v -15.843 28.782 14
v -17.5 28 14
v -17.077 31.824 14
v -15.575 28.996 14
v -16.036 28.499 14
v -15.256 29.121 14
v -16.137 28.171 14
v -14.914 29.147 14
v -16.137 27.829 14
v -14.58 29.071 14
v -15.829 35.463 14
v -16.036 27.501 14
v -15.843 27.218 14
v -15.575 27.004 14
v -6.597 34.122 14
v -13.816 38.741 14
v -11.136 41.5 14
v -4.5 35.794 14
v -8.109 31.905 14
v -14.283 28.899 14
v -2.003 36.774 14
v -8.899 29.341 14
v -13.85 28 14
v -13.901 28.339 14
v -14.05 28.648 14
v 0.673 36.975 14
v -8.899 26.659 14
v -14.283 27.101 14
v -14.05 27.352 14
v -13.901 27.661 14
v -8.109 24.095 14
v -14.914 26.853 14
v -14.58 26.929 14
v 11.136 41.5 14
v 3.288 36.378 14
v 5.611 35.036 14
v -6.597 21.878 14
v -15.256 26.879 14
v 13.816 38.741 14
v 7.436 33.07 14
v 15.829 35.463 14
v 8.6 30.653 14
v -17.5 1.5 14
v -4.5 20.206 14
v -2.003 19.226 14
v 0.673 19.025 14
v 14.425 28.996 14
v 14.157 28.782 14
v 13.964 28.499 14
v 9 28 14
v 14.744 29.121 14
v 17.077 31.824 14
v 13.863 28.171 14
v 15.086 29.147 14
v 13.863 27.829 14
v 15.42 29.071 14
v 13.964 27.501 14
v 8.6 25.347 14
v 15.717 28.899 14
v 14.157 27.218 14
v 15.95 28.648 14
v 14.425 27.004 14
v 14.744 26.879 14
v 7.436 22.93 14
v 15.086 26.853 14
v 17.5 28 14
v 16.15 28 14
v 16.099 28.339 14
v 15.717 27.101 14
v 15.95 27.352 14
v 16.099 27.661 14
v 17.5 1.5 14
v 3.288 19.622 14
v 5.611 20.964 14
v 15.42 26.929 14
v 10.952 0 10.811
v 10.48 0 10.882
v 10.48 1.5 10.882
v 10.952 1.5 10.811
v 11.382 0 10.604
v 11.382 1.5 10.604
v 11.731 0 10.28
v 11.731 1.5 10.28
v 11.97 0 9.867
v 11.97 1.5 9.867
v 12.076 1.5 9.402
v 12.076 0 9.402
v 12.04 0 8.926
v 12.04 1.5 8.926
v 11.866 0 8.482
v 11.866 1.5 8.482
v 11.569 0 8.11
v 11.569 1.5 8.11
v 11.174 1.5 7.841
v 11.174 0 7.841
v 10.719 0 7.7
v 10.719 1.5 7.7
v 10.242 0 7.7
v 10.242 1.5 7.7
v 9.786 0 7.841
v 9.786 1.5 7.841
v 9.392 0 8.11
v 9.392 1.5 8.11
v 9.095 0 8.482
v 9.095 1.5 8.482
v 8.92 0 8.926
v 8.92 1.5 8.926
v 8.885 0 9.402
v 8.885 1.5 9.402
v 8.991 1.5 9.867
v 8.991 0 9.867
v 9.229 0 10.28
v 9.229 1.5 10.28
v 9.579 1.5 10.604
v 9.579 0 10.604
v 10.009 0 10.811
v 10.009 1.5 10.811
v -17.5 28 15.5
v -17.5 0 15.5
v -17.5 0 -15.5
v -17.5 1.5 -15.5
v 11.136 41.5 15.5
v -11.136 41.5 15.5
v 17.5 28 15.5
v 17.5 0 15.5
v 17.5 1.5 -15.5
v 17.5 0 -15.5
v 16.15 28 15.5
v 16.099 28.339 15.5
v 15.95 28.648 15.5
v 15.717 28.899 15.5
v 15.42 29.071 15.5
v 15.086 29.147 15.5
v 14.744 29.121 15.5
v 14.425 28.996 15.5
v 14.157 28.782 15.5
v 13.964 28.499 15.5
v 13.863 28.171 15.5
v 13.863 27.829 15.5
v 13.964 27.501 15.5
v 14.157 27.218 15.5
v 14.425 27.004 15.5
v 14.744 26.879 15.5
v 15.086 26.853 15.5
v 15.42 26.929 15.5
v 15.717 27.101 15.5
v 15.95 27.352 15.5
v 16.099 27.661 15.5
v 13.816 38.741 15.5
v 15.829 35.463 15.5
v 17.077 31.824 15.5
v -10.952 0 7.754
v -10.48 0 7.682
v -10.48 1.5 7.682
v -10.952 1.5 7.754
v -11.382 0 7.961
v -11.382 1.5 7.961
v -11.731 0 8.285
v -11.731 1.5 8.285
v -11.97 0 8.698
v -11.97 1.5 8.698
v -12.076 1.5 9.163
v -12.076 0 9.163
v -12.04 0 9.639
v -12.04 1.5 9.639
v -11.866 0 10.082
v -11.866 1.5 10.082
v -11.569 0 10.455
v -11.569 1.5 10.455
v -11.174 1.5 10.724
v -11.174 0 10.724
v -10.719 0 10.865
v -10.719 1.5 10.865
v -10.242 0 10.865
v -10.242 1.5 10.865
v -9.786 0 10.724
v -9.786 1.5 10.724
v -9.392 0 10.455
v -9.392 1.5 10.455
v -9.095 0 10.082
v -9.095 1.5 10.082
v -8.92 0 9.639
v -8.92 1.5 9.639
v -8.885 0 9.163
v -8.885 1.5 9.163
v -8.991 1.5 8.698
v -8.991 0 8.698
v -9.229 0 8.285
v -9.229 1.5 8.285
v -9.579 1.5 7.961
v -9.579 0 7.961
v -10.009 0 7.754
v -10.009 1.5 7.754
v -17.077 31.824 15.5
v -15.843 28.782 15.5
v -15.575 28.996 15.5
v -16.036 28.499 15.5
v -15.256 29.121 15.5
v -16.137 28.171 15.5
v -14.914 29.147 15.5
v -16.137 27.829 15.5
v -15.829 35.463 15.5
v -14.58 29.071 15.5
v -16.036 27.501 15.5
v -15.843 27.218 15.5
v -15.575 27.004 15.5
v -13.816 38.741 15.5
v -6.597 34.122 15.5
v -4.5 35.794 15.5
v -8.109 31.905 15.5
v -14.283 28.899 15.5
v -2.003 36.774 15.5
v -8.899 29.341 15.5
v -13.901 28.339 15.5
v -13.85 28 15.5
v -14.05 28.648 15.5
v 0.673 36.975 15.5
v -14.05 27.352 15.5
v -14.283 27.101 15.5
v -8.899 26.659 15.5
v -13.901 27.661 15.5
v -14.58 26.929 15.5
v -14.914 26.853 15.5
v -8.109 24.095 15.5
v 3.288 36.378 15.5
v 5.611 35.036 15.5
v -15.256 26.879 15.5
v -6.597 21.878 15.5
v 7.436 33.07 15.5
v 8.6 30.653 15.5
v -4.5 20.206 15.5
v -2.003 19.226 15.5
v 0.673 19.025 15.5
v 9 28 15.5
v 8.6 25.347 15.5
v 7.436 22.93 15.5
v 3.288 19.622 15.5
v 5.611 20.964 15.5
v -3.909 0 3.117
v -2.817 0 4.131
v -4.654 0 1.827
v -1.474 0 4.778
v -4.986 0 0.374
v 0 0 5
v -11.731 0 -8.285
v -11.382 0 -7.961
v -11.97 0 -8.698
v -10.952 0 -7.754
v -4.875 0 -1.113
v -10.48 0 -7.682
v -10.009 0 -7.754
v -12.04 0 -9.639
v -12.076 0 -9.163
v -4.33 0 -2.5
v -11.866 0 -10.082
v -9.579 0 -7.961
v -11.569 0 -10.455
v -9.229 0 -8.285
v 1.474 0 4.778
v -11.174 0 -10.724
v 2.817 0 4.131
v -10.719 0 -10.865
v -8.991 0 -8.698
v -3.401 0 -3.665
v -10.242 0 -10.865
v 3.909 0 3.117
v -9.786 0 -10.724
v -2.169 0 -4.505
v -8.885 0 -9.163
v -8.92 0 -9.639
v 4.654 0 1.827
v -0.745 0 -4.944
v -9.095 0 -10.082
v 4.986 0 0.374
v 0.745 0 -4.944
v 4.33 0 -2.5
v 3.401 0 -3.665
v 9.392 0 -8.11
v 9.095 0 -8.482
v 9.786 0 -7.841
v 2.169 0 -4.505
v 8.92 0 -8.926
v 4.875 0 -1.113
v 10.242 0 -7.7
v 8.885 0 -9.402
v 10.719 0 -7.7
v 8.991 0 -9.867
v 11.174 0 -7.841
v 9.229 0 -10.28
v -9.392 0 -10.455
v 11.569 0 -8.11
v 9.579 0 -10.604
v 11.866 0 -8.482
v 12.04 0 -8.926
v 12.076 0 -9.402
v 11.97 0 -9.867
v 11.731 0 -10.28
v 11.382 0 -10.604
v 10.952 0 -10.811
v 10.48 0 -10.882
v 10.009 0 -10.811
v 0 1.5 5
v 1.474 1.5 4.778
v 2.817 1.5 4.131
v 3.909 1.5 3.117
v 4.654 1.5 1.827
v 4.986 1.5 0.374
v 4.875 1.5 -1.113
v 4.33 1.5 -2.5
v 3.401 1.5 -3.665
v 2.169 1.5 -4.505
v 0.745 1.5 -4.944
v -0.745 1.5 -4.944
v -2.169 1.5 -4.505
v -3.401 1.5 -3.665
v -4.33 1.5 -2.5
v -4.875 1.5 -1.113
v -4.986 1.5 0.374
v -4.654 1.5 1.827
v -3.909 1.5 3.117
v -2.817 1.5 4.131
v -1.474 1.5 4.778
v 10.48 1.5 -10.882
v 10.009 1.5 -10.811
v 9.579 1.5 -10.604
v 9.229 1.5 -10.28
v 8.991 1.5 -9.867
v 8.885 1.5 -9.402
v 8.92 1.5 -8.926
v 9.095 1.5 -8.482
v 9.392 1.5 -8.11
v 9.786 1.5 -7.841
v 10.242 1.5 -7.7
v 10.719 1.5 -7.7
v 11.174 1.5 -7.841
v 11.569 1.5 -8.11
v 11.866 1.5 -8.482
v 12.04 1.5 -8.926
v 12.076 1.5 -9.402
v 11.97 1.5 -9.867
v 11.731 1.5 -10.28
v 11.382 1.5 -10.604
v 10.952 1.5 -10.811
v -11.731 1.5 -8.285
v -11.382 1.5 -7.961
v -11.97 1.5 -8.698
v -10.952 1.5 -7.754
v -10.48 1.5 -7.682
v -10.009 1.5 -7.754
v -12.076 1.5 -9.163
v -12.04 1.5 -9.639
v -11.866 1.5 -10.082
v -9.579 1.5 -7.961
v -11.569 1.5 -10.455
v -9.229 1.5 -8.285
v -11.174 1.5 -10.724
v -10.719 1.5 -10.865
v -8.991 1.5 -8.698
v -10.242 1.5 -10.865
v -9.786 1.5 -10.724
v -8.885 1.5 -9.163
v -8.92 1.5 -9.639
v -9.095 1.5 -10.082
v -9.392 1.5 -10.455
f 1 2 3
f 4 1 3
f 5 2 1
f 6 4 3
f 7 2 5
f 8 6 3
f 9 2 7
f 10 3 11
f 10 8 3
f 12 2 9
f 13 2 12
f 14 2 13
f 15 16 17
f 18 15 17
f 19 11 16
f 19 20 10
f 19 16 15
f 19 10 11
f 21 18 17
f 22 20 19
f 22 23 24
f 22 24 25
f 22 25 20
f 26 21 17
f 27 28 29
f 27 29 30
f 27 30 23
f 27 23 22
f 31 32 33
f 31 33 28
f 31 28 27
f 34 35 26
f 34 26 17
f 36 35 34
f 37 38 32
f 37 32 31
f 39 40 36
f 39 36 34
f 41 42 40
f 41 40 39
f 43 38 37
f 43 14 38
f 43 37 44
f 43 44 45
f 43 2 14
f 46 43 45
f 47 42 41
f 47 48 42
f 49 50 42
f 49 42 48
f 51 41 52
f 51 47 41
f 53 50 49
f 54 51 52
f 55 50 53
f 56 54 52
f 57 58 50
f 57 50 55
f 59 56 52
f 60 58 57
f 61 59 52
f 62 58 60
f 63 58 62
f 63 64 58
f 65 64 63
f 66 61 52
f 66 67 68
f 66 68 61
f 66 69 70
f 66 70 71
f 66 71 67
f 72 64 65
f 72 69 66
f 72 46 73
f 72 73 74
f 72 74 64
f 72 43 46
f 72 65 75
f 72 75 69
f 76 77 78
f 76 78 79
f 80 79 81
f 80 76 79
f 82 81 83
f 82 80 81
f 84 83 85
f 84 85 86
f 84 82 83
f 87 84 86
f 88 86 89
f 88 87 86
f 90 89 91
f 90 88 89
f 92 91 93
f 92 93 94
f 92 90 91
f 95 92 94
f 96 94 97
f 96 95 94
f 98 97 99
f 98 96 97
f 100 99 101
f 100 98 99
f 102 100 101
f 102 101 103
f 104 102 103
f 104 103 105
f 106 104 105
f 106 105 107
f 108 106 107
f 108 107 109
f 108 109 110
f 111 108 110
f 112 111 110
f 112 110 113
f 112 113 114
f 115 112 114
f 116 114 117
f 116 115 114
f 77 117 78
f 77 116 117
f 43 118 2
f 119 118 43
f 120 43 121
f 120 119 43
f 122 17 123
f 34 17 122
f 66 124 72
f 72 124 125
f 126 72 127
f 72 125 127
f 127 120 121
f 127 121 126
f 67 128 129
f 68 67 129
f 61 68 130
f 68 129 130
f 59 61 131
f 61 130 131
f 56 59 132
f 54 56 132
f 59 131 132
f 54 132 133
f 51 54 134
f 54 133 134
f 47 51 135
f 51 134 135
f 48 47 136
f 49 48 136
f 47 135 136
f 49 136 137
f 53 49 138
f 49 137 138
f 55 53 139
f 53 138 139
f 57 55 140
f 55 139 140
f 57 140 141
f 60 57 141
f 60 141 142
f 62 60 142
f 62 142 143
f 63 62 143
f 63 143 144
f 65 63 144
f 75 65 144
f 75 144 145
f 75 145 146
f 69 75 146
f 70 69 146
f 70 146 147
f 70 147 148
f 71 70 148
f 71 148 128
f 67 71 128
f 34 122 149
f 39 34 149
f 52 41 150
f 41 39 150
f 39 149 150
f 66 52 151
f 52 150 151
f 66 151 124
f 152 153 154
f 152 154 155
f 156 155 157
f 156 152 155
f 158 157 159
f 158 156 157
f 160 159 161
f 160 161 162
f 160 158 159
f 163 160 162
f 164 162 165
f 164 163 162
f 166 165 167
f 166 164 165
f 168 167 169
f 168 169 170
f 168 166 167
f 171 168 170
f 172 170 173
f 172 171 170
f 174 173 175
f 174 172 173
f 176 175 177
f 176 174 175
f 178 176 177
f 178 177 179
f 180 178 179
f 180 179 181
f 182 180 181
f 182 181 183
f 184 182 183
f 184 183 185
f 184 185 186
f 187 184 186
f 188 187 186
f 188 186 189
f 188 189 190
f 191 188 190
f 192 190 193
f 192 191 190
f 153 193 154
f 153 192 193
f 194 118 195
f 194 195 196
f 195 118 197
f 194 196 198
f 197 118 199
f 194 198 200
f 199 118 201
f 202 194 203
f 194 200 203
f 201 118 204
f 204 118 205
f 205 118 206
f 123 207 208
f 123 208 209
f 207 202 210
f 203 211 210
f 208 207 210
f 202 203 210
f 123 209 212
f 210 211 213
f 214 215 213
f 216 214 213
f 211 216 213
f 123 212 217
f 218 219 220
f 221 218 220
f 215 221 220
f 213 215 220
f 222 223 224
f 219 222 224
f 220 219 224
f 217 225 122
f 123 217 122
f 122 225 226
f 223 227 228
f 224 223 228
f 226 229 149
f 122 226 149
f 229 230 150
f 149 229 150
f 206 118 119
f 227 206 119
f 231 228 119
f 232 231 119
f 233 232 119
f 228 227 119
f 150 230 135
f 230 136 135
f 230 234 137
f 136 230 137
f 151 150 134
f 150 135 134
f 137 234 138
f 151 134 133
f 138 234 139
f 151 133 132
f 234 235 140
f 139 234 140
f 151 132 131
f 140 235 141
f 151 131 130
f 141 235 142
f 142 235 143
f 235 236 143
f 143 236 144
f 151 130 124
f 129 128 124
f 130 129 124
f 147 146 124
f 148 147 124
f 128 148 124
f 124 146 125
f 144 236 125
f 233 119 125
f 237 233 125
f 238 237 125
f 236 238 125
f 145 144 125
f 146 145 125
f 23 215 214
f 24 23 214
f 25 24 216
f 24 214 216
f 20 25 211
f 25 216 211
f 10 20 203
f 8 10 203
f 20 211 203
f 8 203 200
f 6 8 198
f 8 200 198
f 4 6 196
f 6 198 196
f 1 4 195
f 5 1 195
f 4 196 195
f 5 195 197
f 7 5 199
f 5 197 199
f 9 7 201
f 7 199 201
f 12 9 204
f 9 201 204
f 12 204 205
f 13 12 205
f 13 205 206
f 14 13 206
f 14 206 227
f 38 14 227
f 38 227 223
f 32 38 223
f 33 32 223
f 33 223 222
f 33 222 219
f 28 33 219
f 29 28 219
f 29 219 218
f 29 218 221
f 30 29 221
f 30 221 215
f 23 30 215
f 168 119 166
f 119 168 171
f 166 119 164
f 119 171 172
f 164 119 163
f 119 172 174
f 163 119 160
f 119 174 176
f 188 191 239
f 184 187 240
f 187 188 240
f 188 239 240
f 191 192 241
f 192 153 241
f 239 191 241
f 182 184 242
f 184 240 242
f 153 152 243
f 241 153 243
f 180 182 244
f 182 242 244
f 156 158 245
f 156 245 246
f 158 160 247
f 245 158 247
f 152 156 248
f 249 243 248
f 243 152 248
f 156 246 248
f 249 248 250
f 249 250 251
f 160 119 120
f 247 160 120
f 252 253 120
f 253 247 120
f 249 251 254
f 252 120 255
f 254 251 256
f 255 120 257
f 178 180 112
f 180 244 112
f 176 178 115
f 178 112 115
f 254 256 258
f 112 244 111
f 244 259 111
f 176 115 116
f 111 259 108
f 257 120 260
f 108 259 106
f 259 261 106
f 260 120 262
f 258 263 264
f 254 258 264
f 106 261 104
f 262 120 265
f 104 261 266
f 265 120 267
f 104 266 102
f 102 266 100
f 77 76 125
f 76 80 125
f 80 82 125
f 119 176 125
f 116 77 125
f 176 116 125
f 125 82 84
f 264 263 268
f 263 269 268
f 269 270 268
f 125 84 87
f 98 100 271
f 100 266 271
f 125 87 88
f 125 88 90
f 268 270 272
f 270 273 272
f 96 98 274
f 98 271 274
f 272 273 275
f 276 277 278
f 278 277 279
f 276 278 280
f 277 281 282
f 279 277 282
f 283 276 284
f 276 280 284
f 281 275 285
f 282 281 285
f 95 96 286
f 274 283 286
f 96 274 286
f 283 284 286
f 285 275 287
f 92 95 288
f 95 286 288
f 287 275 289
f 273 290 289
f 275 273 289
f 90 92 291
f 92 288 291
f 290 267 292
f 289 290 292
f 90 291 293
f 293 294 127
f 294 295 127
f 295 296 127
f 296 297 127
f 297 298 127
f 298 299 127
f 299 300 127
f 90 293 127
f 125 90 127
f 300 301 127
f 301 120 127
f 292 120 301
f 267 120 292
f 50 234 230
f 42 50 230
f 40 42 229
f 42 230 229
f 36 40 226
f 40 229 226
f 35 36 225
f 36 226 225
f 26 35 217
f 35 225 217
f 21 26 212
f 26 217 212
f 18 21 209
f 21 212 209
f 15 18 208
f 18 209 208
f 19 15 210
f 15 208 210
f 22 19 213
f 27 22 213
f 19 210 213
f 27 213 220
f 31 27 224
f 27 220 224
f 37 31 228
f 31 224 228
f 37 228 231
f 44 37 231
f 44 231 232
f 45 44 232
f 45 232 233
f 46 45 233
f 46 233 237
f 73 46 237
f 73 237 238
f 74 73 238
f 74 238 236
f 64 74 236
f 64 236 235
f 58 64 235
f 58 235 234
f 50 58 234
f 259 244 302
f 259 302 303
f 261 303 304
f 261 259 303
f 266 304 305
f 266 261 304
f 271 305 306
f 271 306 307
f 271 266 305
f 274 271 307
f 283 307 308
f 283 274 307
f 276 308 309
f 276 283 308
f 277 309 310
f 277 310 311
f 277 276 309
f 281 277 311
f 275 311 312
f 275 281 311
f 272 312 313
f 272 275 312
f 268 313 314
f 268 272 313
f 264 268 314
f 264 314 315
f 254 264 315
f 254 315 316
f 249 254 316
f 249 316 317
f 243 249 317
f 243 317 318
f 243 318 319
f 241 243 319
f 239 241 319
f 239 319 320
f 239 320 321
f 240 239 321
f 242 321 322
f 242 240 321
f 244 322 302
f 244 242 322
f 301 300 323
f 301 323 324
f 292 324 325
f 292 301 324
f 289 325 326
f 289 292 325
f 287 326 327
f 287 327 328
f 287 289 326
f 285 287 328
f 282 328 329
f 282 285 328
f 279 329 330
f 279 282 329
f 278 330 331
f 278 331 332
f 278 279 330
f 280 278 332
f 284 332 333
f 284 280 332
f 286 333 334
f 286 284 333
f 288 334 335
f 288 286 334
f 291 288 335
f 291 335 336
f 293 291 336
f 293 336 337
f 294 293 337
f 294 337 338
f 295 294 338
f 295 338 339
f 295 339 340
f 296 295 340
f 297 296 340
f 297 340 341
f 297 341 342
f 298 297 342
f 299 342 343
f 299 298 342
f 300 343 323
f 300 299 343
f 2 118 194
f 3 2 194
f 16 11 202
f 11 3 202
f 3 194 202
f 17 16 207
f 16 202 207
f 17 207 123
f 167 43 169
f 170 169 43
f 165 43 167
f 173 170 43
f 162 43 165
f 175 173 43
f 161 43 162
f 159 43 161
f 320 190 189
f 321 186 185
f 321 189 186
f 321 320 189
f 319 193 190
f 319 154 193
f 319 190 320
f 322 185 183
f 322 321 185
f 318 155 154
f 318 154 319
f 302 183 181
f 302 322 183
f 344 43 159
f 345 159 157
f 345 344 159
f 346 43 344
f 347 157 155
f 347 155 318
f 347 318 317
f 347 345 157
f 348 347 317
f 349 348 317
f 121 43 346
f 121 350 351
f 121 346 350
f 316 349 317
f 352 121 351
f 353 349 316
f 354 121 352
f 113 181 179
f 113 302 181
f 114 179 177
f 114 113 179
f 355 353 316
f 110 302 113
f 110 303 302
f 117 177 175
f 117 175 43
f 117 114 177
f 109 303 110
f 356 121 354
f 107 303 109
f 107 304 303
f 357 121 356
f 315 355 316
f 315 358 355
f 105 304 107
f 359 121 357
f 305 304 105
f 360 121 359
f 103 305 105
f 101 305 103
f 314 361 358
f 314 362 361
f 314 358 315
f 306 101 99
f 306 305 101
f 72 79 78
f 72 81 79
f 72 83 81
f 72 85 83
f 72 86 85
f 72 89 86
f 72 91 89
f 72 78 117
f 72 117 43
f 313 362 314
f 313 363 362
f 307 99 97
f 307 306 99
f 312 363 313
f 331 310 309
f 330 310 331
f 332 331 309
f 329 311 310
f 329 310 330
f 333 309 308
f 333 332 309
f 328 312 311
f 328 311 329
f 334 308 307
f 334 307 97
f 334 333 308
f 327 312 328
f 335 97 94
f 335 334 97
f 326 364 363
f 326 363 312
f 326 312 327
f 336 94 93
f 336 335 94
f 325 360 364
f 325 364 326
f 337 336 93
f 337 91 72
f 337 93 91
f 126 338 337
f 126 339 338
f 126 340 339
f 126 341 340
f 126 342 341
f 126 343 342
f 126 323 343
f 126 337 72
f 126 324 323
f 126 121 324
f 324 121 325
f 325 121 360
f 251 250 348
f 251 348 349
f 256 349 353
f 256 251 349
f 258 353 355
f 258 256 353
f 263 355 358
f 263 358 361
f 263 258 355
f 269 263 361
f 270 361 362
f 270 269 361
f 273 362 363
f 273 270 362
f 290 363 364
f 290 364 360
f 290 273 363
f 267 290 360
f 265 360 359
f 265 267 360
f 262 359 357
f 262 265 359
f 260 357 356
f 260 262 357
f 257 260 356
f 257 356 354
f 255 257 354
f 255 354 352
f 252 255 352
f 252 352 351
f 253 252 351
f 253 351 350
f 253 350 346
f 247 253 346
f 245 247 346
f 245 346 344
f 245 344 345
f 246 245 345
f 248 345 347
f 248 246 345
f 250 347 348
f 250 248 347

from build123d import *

# Parameters (mm, degrees)
ESQUISSE1_W             = 35
ESQUISSE1_H             = 31
ESQUISSE1_R             = 1.6
ESQUISSE1_R_2           = 5
BOSS_EXTRU_1_DEPTH      = 1.5
ESQUISSE2_W             = 35
ESQUISSE2_H             = 1.5
BOSS_EXTRU_2_DEPTH      = 40
ENL_V_MAT_EXTRU_1_DEPTH = 32.5
ESQUISSE4_R             = 9
ESQUISSE4_R_2           = 1.15
ENL_V_MAT_EXTRU_2_DEPTH = 32.5


with BuildPart() as part:
    # Esquisse1 → Boss.-Extru.1 (new body)
    with BuildSketch(Plane(origin=(0, 0, 0), x_dir=(1, 0, 0), z_dir=(0, 1, 0))):
        Rectangle(ESQUISSE1_W, ESQUISSE1_H)
        with Locations(Location((-10.480234522, 9.282493434, 0), (0, 0, 270))):
            Circle(ESQUISSE1_R, mode=Mode.SUBTRACT)
        with Locations(Location((0, 0, 0), (0, 0, 270))):
            Circle(ESQUISSE1_R_2, mode=Mode.SUBTRACT)
        with Locations(Location((10.480234522, 9.282493434, 0), (0, 0, 90))):
            Circle(ESQUISSE1_R, mode=Mode.SUBTRACT)
        with Locations(Location((10.480234522, -9.282493434, 0), (0, 0, 270))):
            Circle(ESQUISSE1_R, mode=Mode.SUBTRACT)
        with Locations(Location((-10.480234522, -9.282493434, 0), (0, 0, 90))):
            Circle(ESQUISSE1_R, mode=Mode.SUBTRACT)
    extrude(amount=BOSS_EXTRU_1_DEPTH)

    # Esquisse2 → Boss.-Extru.2 (add)
    with BuildSketch(Plane(origin=(0, 1.5, 0), x_dir=(1, 0, 0), z_dir=(0, 1, 0))):
        with Locations((0, -14.75)):
            Rectangle(ESQUISSE2_W, ESQUISSE2_H)
    extrude(amount=BOSS_EXTRU_2_DEPTH)

    # Esquisse3 → Enlèv. mat.-Extru.1 (cut)
    with BuildSketch(Plane.XY.offset(15.5)):
        with BuildLine():
            Line((-17.5, 41.5), (-17.5, 28))
            ThreePointArc((-17.5, 28), (-15.829114832, 35.462514566), (-11.135528726, 41.5))
            Line((-11.135528726, 41.5), (-17.5, 41.5))
        make_face()
        with BuildLine():
            Line((17.5, 41.5), (11.135528726, 41.5))
            ThreePointArc((11.135528726, 41.5), (15.829114832, 35.462514566), (17.5, 28))
            Line((17.5, 28), (17.5, 41.5))
        make_face()
    extrude(amount=-ENL_V_MAT_EXTRU_1_DEPTH, mode=Mode.SUBTRACT)

    # Esquisse4 → Enlèv. mat.-Extru.2 (cut)
    with BuildSketch(Plane.XY.offset(15.5)):
        with Locations((0, 28)):
            Circle(ESQUISSE4_R)
        with Locations((-15, 28)):
            Circle(ESQUISSE4_R_2)
        with Locations((15, 28)):
            Circle(ESQUISSE4_R_2)
    extrude(amount=-ENL_V_MAT_EXTRU_2_DEPTH, mode=Mode.SUBTRACT)


solid = part.part
